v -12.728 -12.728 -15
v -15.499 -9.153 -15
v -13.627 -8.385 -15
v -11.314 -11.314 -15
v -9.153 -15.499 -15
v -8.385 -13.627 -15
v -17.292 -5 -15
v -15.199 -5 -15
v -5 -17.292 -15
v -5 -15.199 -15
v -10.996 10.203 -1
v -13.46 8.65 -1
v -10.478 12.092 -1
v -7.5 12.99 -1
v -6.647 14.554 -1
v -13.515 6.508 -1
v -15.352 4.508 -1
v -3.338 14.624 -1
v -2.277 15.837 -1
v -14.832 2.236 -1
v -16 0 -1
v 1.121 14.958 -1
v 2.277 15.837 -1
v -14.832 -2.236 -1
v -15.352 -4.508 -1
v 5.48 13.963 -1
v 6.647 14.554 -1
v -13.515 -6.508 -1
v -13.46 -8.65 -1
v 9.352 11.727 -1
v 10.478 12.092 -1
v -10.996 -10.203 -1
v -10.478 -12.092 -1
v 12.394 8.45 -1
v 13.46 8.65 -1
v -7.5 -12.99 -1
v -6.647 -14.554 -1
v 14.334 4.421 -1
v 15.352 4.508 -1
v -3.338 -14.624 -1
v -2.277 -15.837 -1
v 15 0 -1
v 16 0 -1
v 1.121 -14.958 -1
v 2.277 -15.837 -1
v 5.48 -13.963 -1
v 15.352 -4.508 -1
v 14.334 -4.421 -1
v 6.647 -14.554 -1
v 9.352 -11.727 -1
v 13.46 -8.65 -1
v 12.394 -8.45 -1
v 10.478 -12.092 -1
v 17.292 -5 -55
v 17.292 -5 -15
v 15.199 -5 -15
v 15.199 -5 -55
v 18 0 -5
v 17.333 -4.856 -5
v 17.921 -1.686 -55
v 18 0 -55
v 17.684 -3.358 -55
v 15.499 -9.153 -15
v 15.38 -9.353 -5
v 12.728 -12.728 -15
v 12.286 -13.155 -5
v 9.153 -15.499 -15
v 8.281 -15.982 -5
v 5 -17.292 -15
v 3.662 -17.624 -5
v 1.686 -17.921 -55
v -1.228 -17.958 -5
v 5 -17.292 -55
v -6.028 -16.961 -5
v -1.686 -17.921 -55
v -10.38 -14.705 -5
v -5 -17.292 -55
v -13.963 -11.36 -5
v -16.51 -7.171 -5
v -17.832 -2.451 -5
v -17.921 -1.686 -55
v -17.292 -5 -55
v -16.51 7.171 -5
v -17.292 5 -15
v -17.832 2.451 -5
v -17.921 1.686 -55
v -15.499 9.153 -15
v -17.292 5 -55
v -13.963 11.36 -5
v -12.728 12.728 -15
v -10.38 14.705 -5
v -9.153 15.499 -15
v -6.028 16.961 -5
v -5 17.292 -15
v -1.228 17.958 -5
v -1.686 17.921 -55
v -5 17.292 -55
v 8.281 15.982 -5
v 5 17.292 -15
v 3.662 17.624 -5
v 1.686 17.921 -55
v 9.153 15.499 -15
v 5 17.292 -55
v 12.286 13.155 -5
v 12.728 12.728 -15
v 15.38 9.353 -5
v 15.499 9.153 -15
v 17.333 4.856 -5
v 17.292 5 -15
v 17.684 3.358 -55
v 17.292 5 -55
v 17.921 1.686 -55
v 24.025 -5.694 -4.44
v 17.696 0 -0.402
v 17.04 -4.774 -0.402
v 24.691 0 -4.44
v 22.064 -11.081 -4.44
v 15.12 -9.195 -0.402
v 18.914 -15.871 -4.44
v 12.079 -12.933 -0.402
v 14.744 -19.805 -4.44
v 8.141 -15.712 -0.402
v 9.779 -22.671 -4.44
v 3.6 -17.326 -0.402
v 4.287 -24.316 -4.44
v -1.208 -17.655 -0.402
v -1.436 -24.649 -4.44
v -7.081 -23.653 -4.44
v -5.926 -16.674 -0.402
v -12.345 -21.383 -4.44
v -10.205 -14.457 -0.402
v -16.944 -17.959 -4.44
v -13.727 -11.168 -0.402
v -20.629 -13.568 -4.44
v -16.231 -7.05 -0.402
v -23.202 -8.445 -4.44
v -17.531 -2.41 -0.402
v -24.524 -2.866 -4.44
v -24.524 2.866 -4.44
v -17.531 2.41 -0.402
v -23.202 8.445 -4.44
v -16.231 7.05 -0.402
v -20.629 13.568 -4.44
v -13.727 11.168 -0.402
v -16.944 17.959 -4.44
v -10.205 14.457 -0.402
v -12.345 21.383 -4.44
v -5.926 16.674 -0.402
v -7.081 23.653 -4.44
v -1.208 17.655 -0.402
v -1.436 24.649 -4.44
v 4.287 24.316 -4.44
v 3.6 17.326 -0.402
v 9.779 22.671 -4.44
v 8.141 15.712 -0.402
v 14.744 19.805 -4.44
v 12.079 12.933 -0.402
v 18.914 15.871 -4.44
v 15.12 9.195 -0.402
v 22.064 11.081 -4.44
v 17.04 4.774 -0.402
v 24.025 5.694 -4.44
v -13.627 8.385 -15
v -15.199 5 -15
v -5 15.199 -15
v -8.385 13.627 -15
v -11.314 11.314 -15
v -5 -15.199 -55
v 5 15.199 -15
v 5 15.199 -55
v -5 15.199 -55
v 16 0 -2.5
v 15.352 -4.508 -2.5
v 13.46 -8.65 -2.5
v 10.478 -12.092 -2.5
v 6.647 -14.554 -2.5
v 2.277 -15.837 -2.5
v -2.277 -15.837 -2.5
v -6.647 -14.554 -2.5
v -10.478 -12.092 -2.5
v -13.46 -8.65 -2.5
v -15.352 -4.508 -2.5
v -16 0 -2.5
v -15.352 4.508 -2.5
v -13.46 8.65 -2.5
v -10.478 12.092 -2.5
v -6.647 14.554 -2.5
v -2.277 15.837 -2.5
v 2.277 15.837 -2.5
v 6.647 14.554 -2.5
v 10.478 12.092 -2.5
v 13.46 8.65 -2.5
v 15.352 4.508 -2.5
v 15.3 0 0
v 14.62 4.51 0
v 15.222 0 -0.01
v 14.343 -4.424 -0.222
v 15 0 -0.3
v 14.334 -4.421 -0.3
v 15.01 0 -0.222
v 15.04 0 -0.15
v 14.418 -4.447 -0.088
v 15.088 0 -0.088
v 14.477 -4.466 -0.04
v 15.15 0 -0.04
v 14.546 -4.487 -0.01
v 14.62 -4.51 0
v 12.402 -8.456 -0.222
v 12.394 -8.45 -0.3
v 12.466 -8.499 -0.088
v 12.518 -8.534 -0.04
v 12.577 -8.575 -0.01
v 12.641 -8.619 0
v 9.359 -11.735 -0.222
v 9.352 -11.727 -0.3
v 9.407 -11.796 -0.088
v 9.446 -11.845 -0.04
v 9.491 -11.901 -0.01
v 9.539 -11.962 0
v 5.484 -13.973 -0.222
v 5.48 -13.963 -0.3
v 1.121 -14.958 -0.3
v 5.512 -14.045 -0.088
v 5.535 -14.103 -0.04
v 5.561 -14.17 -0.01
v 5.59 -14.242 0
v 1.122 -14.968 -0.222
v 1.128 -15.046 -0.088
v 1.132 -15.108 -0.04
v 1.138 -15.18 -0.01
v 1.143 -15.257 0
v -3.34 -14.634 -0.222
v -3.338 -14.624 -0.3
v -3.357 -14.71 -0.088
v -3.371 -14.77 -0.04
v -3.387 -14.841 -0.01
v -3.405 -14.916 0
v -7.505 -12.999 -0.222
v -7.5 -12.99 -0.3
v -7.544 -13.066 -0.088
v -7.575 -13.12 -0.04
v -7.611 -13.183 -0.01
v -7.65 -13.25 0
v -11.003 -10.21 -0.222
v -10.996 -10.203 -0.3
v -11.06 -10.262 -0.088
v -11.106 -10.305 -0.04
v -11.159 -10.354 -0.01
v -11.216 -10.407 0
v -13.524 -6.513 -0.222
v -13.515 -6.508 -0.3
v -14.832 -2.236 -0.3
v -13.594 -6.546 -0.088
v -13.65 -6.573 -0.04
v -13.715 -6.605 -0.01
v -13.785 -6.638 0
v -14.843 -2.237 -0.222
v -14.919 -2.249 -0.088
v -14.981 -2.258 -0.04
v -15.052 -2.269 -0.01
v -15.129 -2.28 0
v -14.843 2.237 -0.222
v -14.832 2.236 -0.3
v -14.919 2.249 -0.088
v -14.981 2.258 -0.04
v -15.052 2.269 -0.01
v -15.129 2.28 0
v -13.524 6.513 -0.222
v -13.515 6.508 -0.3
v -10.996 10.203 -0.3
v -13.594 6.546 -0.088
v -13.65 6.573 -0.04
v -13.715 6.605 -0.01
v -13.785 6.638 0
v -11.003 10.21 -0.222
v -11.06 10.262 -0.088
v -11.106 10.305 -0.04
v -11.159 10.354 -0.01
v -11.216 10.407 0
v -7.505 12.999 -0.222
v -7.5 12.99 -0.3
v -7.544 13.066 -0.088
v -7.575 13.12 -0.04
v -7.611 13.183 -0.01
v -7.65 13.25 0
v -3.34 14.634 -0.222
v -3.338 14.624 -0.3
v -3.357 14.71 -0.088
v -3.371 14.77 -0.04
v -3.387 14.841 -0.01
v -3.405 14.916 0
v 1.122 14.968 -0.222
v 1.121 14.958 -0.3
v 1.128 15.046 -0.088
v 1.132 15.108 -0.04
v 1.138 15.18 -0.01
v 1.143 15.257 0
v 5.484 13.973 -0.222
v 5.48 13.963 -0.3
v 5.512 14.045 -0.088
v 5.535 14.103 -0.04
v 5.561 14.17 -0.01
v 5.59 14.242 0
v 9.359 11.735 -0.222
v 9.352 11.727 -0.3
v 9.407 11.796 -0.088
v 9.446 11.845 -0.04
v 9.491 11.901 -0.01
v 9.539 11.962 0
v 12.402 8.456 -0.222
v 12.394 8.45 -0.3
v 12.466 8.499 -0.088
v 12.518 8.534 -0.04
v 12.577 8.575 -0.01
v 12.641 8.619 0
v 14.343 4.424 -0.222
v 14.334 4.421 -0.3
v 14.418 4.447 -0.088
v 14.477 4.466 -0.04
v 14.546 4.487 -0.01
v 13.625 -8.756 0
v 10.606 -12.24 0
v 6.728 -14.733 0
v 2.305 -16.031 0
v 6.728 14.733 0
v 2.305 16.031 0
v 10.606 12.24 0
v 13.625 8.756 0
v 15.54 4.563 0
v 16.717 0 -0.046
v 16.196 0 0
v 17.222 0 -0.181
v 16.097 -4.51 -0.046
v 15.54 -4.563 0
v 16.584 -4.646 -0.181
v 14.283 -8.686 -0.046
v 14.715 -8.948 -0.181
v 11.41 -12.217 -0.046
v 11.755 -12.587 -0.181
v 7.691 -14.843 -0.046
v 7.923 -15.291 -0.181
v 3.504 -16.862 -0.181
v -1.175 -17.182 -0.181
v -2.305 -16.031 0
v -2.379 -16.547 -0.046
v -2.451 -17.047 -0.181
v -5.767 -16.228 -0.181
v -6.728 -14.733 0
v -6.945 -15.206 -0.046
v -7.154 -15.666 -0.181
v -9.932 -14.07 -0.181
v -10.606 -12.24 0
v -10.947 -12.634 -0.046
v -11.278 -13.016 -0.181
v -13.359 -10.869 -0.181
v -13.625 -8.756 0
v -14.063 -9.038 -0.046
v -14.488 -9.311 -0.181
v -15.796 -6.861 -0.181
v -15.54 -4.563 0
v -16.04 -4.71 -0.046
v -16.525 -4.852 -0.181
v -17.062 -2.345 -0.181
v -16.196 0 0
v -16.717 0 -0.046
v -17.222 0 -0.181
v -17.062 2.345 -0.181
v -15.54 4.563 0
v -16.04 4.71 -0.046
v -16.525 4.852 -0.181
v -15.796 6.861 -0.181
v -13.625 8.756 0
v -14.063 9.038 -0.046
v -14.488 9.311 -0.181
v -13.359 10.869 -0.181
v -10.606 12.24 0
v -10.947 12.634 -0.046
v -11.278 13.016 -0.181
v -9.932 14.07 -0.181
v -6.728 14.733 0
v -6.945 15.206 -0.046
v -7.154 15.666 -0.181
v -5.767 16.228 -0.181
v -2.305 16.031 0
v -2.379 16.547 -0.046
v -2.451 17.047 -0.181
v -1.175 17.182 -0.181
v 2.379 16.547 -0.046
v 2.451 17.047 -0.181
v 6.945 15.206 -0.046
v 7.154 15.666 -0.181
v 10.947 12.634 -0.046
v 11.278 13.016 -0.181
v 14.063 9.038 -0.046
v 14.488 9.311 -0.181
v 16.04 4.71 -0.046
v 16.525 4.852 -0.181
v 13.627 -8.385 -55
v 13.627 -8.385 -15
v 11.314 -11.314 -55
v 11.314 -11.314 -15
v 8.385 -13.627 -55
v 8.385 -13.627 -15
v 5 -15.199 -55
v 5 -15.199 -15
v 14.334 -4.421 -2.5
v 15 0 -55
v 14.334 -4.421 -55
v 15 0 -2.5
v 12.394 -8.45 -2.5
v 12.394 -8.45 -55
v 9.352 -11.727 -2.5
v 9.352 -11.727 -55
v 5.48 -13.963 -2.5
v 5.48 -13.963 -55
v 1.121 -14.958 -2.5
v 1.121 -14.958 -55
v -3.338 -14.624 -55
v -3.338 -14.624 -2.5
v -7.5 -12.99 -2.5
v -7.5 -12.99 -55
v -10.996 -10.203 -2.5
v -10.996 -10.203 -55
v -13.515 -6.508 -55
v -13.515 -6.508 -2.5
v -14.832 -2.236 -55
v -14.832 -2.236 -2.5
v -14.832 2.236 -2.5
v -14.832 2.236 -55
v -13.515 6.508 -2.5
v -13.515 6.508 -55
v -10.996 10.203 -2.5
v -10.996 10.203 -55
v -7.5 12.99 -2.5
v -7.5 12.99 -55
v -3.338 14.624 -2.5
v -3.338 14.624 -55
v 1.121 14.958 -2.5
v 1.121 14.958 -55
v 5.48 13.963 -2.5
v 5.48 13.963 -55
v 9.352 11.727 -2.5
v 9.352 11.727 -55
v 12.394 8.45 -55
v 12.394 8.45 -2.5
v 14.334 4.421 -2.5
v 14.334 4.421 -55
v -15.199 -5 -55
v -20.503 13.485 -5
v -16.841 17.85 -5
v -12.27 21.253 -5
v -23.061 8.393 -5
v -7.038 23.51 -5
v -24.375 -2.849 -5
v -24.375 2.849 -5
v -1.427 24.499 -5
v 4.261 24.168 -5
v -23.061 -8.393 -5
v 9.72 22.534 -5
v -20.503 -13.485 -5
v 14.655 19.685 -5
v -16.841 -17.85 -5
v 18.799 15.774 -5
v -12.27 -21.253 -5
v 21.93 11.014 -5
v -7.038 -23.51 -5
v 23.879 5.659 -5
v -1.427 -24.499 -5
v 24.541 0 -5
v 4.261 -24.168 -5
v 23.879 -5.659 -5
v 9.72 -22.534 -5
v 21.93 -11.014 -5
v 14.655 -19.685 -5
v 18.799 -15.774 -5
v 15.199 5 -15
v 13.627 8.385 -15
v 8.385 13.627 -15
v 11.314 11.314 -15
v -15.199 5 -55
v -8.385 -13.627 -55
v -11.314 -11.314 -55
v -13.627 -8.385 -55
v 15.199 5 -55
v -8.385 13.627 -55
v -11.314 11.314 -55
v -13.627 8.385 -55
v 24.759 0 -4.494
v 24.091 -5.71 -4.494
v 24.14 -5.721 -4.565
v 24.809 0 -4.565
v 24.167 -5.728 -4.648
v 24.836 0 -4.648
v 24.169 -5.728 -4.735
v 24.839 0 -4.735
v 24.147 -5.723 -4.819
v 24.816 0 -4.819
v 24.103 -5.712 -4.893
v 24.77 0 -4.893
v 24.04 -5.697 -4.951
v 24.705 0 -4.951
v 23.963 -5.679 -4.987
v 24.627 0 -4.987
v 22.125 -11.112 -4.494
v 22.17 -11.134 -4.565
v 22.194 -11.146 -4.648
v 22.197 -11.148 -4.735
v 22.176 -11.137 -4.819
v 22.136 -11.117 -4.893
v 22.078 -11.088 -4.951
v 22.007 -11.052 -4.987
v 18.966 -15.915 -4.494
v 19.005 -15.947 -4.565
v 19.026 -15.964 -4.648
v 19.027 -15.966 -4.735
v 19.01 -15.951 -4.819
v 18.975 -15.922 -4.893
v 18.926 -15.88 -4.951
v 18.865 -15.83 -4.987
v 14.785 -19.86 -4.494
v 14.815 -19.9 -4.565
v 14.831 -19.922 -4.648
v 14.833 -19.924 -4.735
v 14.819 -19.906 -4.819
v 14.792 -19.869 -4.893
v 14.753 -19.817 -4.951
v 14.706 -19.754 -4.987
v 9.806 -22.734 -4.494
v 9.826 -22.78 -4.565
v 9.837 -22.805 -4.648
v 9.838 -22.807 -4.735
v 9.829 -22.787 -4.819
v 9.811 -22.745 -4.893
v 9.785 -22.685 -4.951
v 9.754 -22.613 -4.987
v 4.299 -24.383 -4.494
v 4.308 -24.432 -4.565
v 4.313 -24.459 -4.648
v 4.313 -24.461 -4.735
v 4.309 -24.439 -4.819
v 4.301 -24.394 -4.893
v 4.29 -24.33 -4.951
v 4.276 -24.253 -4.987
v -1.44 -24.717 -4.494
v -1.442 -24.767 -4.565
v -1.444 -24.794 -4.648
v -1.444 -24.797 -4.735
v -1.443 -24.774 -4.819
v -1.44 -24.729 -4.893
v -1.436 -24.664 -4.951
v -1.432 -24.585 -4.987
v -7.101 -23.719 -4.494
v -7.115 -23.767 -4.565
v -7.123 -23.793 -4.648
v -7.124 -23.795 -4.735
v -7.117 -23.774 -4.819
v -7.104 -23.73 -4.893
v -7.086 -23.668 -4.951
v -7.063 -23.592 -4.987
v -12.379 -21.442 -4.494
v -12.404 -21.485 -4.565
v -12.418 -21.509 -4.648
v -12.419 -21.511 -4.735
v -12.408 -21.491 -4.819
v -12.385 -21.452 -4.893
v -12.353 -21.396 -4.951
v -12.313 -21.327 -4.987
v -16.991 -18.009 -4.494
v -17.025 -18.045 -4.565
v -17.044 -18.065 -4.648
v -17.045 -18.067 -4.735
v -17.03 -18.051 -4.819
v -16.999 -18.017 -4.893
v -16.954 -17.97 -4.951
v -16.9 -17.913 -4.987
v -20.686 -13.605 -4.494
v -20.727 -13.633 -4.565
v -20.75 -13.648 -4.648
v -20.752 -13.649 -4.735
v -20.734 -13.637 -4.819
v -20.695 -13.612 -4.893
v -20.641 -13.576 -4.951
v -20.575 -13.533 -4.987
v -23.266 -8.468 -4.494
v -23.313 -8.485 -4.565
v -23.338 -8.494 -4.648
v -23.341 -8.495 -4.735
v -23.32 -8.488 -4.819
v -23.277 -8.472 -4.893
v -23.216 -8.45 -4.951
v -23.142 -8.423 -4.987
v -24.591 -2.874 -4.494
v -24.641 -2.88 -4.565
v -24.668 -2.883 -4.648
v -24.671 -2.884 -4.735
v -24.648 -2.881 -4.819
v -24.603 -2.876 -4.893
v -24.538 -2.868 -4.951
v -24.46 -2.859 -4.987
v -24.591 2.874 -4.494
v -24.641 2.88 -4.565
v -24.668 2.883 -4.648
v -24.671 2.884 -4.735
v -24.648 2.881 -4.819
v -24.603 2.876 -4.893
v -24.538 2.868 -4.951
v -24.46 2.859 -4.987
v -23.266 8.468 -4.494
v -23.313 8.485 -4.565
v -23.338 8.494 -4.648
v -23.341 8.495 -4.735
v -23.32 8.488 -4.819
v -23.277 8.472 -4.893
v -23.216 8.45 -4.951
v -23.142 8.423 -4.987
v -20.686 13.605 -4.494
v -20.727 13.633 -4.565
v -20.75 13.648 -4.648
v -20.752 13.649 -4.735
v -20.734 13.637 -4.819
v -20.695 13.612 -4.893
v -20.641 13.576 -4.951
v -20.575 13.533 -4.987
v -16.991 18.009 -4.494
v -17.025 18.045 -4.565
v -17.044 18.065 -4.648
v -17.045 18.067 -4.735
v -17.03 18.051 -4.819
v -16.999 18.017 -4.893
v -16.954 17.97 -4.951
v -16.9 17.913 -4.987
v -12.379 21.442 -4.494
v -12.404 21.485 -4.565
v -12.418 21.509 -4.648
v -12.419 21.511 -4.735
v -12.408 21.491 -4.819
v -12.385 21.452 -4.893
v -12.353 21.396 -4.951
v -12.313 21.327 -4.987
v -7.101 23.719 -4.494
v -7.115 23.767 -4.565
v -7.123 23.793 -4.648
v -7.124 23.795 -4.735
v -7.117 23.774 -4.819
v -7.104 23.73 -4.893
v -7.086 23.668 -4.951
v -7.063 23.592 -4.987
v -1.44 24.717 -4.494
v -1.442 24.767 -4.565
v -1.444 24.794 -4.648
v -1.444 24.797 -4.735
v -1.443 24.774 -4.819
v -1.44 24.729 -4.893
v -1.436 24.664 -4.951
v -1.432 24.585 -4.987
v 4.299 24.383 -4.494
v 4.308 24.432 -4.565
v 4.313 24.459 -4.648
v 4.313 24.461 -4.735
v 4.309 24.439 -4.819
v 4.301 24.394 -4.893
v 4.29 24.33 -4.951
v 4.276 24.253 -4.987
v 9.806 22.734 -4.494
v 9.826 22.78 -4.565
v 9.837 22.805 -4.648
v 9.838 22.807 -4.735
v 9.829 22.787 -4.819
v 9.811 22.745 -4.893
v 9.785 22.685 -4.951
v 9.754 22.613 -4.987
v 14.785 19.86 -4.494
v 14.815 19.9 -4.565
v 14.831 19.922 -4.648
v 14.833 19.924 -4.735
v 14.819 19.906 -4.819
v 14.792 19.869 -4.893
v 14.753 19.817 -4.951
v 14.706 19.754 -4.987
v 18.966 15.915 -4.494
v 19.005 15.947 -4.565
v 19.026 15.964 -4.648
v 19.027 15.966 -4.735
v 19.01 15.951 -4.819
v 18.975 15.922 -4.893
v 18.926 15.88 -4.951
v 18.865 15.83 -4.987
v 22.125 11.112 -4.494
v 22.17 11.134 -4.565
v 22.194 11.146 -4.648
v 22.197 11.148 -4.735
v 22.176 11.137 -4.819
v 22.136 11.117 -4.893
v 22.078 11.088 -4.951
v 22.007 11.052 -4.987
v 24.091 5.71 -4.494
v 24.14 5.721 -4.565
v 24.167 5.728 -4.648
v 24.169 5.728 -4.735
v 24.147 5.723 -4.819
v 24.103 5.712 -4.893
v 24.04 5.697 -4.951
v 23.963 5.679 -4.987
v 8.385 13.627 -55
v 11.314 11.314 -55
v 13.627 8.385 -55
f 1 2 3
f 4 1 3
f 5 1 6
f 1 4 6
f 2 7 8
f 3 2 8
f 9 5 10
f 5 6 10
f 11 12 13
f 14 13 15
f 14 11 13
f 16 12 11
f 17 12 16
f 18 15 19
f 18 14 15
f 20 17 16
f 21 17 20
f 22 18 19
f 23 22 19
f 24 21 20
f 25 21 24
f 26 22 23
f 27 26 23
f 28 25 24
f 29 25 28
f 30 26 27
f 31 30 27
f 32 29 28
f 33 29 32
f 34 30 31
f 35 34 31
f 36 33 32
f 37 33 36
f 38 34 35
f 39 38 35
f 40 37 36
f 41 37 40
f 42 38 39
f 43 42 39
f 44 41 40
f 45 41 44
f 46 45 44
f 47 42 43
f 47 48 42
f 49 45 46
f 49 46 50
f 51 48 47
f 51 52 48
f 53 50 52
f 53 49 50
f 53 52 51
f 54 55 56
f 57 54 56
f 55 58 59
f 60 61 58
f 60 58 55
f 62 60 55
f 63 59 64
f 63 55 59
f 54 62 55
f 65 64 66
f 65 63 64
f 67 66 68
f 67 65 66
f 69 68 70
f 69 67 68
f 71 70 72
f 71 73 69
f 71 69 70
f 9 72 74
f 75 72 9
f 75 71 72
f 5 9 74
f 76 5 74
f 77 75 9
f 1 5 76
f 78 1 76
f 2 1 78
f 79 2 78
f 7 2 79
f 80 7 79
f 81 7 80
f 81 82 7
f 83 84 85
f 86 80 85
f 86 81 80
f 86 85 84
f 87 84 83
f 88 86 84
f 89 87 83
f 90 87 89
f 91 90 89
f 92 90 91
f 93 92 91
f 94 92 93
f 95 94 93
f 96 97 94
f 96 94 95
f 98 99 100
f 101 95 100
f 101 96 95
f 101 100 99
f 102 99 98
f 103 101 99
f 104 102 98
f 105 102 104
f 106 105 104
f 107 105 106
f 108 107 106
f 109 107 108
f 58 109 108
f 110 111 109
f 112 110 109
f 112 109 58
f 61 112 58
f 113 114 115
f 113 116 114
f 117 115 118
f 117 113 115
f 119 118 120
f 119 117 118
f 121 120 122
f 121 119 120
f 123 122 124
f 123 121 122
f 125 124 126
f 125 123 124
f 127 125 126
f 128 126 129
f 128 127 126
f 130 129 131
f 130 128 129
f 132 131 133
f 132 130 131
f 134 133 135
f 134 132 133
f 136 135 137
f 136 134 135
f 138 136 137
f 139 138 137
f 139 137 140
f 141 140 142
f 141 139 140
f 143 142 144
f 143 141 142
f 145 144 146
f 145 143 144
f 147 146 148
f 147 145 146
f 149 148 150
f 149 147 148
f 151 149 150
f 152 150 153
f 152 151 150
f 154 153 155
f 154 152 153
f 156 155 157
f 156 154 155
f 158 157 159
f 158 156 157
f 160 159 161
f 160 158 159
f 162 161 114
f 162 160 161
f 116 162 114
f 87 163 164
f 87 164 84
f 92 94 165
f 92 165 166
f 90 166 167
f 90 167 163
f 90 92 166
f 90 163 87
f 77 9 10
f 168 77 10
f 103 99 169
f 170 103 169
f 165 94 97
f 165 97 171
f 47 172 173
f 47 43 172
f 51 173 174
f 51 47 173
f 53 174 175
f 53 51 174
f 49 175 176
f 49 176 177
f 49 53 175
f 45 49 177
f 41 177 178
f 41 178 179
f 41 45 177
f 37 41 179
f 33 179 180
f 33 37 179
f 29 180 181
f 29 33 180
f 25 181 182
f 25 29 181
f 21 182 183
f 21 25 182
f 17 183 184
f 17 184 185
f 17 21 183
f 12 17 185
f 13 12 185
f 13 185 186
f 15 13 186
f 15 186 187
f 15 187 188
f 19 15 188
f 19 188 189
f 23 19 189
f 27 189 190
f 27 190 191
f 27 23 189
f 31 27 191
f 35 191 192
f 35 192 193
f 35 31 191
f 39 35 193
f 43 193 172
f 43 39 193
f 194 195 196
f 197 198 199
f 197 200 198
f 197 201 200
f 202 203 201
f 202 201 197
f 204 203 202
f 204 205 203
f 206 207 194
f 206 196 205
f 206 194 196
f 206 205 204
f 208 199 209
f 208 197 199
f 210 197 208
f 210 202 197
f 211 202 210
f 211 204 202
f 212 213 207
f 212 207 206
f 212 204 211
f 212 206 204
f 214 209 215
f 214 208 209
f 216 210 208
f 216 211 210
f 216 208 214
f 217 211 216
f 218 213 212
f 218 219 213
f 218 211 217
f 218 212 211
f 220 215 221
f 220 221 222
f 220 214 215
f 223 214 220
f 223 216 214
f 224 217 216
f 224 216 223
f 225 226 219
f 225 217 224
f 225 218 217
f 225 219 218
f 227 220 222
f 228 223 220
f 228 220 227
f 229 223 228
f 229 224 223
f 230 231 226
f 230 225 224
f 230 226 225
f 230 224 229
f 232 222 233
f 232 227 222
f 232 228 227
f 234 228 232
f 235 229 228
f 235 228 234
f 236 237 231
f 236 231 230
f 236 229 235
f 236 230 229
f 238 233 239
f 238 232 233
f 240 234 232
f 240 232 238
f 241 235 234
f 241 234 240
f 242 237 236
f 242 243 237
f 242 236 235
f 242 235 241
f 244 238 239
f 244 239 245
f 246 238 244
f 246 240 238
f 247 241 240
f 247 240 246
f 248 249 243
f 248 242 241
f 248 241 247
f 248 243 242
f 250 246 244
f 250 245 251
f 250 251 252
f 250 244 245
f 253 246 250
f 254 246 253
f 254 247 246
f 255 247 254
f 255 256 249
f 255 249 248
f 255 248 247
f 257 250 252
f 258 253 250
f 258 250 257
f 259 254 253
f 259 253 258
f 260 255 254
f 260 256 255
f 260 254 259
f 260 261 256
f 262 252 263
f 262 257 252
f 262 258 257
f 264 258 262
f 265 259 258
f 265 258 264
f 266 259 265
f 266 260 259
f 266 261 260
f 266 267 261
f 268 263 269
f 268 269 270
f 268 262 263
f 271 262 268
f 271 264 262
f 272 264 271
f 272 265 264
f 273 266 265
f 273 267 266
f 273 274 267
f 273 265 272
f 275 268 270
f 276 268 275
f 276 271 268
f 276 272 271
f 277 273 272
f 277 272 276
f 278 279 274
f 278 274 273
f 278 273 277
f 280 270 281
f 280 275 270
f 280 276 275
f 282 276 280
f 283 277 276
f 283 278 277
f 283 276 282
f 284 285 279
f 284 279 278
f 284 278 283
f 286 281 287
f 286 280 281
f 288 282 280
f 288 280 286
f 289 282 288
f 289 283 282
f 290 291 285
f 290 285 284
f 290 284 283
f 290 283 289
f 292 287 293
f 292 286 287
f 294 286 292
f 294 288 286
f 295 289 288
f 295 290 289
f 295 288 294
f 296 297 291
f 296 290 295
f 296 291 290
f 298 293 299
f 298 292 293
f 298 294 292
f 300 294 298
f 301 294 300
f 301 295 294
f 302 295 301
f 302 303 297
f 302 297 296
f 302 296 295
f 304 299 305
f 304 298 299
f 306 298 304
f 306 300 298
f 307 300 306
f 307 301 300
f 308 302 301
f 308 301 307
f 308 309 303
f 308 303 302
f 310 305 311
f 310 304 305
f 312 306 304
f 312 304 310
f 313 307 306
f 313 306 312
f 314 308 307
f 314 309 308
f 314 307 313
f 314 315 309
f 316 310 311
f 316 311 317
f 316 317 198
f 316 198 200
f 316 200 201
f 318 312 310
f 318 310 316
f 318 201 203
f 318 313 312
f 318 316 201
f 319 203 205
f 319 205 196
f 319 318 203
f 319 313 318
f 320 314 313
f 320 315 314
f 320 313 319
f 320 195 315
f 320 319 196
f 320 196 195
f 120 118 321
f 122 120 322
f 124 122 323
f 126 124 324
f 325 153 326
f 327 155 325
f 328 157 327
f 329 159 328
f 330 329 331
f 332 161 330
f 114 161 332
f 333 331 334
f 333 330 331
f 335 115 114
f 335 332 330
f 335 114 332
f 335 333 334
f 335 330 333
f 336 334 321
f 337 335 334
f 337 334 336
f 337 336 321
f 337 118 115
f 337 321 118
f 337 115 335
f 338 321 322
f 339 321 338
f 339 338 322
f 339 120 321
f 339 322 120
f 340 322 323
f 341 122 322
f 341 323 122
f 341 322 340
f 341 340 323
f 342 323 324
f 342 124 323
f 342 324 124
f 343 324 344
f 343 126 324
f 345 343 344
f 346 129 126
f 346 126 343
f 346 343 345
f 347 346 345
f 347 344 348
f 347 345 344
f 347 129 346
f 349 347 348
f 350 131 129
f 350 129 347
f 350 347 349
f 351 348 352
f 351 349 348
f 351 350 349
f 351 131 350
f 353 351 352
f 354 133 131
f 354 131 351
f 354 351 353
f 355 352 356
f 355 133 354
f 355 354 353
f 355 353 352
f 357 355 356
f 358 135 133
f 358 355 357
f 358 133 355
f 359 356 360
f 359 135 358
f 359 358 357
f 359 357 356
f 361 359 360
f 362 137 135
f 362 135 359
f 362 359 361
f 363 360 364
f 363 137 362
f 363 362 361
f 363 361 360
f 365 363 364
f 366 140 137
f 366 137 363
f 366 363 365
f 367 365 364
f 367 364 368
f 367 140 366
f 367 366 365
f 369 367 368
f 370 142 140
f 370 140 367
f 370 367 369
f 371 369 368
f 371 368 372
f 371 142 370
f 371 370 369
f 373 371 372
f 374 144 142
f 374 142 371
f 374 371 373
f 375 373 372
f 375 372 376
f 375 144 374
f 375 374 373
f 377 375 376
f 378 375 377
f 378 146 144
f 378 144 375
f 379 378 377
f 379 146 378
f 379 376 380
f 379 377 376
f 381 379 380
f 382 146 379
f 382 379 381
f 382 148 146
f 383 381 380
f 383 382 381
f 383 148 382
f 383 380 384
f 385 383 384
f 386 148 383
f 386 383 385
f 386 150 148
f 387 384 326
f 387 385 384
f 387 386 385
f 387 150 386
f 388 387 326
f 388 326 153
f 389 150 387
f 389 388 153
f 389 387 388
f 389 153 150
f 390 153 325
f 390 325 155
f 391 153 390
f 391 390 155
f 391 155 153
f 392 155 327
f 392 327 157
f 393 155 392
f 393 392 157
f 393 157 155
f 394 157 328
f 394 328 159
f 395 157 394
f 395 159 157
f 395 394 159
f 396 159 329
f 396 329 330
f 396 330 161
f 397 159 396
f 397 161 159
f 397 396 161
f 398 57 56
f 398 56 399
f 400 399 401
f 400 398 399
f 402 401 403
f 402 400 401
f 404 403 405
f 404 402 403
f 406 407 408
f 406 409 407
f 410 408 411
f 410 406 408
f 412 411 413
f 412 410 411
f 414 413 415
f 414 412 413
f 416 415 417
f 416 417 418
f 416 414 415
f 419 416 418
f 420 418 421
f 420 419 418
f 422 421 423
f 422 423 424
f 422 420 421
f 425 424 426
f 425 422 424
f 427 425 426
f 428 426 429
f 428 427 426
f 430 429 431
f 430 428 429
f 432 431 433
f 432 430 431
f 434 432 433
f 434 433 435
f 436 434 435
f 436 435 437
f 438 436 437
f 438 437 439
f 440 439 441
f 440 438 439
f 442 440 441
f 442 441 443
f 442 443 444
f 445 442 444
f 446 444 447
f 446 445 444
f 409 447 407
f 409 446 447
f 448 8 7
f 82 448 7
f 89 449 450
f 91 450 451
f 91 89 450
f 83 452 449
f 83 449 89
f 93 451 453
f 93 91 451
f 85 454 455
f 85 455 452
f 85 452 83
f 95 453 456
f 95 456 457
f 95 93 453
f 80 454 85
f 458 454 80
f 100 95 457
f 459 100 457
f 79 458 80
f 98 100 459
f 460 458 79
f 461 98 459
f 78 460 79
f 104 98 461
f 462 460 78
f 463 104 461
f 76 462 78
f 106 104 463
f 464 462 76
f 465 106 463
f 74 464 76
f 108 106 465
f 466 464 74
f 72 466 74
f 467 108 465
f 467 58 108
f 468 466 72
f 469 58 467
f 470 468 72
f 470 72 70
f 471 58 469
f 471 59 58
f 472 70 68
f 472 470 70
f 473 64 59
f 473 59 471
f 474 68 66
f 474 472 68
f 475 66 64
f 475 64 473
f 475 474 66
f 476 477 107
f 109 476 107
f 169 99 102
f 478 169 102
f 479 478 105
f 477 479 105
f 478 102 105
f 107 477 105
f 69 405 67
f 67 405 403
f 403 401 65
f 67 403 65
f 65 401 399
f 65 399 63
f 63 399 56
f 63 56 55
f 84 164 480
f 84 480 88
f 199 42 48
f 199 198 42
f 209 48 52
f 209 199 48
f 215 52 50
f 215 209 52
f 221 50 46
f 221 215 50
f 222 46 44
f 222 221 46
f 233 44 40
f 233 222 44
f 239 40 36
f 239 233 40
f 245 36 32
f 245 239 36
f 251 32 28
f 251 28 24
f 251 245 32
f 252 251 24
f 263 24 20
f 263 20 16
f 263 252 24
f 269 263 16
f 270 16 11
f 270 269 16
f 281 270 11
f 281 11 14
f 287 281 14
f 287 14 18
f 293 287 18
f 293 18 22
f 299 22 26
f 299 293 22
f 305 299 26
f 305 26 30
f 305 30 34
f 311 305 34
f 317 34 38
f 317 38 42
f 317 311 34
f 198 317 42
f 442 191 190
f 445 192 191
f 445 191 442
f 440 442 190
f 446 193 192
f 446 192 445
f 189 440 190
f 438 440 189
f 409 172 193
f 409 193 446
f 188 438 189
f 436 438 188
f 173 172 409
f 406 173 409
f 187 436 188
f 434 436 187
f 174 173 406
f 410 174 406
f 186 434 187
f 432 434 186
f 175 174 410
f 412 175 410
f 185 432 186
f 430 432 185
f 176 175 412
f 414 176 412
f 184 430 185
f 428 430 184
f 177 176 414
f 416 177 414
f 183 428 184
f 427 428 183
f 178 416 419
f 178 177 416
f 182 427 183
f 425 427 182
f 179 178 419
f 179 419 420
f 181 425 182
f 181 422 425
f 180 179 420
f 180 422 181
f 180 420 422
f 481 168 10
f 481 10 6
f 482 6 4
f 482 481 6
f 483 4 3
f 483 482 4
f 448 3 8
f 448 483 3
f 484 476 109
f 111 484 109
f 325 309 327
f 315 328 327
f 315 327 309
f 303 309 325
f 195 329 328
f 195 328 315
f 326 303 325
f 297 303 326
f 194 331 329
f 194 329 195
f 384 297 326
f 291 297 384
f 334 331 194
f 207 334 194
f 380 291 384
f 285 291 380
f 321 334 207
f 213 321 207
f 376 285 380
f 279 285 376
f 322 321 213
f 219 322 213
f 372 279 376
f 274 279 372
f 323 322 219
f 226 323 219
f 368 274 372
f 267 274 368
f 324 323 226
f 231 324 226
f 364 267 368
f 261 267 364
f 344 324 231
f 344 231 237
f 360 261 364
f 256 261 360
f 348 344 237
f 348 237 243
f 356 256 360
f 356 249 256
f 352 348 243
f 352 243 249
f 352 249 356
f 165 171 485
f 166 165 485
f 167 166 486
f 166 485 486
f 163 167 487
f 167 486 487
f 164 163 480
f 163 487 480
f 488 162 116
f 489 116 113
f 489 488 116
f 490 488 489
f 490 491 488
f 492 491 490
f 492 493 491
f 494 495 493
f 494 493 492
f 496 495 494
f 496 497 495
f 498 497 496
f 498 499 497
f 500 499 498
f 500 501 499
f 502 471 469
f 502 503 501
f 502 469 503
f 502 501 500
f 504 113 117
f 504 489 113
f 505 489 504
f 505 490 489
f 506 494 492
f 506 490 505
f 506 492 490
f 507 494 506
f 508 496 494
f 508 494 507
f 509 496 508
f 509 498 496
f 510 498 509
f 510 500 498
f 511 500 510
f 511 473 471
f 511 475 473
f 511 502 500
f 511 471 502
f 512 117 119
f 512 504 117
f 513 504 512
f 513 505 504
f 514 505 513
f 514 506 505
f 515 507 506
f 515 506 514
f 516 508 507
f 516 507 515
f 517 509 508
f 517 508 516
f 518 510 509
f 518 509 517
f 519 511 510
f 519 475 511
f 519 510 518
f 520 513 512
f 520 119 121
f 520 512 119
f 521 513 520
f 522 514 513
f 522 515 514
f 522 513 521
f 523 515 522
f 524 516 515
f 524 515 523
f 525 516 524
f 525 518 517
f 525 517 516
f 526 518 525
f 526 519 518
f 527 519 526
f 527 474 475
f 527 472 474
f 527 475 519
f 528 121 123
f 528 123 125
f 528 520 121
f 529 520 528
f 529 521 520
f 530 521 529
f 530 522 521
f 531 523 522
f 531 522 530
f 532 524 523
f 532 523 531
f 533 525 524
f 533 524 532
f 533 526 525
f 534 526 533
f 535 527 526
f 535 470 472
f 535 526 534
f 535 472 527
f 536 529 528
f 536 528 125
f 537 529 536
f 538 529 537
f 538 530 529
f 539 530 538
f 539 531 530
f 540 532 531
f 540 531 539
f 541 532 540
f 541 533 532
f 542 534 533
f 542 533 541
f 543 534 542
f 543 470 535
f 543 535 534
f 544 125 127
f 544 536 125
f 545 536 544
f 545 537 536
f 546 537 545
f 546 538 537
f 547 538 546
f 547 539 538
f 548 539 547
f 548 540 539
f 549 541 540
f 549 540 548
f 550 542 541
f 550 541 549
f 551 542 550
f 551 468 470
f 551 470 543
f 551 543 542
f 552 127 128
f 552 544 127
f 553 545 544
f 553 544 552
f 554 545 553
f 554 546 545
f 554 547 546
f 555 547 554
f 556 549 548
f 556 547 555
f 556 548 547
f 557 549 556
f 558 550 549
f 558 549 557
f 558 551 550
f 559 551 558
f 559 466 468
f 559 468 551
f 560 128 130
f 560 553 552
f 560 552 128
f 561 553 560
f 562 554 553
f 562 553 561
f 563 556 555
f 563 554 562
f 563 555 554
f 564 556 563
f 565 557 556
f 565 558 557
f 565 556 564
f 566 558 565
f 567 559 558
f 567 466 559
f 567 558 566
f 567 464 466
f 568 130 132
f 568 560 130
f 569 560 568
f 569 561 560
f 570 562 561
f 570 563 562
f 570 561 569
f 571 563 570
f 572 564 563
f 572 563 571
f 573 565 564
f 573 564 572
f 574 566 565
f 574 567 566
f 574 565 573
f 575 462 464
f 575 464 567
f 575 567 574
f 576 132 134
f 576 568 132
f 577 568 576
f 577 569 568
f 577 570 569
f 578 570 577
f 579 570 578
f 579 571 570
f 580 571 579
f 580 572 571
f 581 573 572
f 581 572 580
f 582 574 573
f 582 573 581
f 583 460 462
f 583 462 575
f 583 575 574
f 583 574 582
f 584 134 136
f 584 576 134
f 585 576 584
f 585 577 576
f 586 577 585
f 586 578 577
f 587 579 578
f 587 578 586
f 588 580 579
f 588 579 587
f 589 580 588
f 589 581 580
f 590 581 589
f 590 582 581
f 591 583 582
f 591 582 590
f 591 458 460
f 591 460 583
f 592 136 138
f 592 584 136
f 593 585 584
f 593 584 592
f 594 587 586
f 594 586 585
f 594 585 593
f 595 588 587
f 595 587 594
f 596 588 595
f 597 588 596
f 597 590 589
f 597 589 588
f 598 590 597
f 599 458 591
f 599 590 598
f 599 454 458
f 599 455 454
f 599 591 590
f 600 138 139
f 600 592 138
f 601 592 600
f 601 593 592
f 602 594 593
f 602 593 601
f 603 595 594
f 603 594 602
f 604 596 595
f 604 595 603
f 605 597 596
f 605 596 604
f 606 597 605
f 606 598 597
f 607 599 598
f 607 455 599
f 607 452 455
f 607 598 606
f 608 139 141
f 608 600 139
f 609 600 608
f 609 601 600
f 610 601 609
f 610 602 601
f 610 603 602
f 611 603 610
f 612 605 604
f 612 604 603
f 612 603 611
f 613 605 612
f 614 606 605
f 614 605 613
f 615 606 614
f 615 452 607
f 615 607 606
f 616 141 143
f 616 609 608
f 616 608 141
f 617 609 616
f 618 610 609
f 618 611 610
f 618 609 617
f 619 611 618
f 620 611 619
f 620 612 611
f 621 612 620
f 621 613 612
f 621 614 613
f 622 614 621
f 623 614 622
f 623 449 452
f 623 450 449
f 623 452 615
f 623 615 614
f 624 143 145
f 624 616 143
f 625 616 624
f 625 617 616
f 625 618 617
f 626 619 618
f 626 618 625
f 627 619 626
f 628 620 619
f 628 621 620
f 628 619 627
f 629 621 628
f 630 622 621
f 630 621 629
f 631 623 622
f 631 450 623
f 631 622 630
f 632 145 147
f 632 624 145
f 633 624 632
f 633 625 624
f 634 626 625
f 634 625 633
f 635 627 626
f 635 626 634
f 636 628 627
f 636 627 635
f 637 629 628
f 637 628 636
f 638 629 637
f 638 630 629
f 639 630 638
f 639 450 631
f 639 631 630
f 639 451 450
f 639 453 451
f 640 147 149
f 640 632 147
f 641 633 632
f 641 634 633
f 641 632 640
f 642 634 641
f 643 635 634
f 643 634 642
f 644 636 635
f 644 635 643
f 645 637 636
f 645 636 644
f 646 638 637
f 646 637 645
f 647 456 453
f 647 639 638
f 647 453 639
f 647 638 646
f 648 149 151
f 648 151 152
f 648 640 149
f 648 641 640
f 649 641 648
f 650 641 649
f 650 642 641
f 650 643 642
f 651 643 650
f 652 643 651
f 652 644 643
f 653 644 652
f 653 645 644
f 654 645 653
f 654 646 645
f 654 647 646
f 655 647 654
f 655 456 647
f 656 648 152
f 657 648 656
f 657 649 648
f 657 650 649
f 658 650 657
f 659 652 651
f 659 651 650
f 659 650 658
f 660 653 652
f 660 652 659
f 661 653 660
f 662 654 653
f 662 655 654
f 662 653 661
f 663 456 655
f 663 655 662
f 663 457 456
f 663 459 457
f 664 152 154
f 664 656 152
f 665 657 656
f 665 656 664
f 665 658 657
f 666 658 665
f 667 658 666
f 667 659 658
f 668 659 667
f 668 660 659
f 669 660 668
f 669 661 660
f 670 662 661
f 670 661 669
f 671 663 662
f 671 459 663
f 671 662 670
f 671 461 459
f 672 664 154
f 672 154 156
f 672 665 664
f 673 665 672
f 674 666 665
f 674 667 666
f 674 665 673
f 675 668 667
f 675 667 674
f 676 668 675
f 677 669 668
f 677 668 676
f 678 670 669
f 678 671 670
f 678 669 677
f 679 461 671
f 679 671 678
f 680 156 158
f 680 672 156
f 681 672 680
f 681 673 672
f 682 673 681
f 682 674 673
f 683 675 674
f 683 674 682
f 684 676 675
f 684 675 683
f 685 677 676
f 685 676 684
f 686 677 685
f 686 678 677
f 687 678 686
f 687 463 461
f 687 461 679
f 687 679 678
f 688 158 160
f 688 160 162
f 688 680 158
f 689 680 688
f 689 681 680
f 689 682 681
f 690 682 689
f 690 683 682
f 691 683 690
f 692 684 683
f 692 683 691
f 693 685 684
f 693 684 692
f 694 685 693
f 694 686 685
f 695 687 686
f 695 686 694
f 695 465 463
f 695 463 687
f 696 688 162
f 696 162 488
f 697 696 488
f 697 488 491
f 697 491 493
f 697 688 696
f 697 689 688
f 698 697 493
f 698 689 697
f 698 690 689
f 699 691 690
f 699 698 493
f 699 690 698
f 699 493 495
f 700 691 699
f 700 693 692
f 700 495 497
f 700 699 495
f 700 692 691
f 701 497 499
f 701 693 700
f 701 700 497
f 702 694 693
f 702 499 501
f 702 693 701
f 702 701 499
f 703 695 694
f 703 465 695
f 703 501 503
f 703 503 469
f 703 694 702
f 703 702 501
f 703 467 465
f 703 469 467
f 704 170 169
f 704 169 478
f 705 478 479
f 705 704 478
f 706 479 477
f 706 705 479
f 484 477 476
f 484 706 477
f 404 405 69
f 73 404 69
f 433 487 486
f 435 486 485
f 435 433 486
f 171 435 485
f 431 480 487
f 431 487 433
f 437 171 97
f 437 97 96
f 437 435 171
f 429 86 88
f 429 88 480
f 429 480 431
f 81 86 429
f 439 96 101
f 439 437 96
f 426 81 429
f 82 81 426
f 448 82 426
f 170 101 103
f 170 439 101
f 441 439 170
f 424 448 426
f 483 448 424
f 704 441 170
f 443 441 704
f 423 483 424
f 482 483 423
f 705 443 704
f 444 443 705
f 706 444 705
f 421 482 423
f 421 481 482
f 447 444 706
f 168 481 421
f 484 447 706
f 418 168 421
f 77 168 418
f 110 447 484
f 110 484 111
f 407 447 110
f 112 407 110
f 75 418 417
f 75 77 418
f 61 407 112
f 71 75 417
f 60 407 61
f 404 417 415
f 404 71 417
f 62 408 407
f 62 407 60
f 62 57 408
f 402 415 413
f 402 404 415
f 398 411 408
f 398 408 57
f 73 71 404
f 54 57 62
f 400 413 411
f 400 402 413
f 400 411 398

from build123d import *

# Parameters (mm, degrees)
CUT_EXTRUDE_1_DEPTH = 40


with BuildPart() as part:
    # 草图1 → 旋转1 (revolve)
    with BuildSketch(Plane(origin=(0, 0, 0), x_dir=(0, 0, -1), z_dir=(1, 0, 0)), mode=Mode.PRIVATE) as revolve_1_sk:
        with BuildLine():
            Line((0, 15.3), (0, 16.196152423))
            ThreePointArc((0, 16.196152423), (0.102222521, 16.972609558), (0.401923789, 17.696152423))
            Line((0.401923789, 17.696152423), (4.440192379, 24.690638796))
            ThreePointArc((4.440192379, 24.690638796), (4.777645714, 24.830416543), (5, 24.540638796))
            Line((5, 24.540638796), (5, 18))
            Line((5, 18), (55, 18))
            Line((55, 18), (55, 15))
            Line((55, 15), (2.5, 15))
            Line((2.5, 15), (2.5, 16))
            Line((2.5, 16), (1, 16))
            Line((1, 16), (1, 15))
            Line((1, 15), (0.3, 15))
            ThreePointArc((0.3, 15), (0.087867966, 15.087867966), (0, 15.3))
        make_face()
    revolve(revolve_1_sk.sketch.rotate(Axis((0, 0, 31.844262295), (0, 0, -1)), 90), axis=Axis((0, 0, 31.844262295), (0, 0, -1)))

    # 草图2 → 切除-拉伸1 (cut)
    with BuildSketch(Plane(origin=(0, 0, -55), x_dir=(-1, 0, 0), z_dir=(0, 0, -1))):
        with BuildLine():
            Line((-5, 17.291616466), (-5, 15.198684154))
            ThreePointArc((-5, 15.198684154), (-11.313708499, 11.313708499), (-15.198684154, 5))
            Line((-15.198684154, 5), (-17.291616466, 5))
            ThreePointArc((-17.291616466, 5), (-12.727922061, 12.727922061), (-5, 17.291616466))
        make_face()
        with BuildLine():
            Line((5, 17.291616466), (5, 15.198684154))
            ThreePointArc((5, 15.198684154), (11.313708499, 11.313708499), (15.198684154, 5))
            Line((15.198684154, 5), (17.291616466, 5))
            ThreePointArc((17.291616466, 5), (12.727922061, 12.727922061), (5, 17.291616466))
        make_face()
        with BuildLine():
            Line((-17.291616466, -5), (-15.198684154, -5))
            ThreePointArc((-15.198684154, -5), (-11.313708499, -11.313708499), (-5, -15.198684154))
            Line((-5, -15.198684154), (-5, -17.291616466))
            ThreePointArc((-5, -17.291616466), (-12.727922061, -12.727922061), (-17.291616466, -5))
        make_face()
        with BuildLine():
            Line((15.198684154, -5), (17.291616466, -5))
            ThreePointArc((17.291616466, -5), (12.727922061, -12.727922061), (5, -17.291616466))
            Line((5, -17.291616466), (5, -15.198684154))
            ThreePointArc((5, -15.198684154), (11.313708499, -11.313708499), (15.198684154, -5))
        make_face()
    extrude(amount=-CUT_EXTRUDE_1_DEPTH, mode=Mode.SUBTRACT)


solid = part.part
